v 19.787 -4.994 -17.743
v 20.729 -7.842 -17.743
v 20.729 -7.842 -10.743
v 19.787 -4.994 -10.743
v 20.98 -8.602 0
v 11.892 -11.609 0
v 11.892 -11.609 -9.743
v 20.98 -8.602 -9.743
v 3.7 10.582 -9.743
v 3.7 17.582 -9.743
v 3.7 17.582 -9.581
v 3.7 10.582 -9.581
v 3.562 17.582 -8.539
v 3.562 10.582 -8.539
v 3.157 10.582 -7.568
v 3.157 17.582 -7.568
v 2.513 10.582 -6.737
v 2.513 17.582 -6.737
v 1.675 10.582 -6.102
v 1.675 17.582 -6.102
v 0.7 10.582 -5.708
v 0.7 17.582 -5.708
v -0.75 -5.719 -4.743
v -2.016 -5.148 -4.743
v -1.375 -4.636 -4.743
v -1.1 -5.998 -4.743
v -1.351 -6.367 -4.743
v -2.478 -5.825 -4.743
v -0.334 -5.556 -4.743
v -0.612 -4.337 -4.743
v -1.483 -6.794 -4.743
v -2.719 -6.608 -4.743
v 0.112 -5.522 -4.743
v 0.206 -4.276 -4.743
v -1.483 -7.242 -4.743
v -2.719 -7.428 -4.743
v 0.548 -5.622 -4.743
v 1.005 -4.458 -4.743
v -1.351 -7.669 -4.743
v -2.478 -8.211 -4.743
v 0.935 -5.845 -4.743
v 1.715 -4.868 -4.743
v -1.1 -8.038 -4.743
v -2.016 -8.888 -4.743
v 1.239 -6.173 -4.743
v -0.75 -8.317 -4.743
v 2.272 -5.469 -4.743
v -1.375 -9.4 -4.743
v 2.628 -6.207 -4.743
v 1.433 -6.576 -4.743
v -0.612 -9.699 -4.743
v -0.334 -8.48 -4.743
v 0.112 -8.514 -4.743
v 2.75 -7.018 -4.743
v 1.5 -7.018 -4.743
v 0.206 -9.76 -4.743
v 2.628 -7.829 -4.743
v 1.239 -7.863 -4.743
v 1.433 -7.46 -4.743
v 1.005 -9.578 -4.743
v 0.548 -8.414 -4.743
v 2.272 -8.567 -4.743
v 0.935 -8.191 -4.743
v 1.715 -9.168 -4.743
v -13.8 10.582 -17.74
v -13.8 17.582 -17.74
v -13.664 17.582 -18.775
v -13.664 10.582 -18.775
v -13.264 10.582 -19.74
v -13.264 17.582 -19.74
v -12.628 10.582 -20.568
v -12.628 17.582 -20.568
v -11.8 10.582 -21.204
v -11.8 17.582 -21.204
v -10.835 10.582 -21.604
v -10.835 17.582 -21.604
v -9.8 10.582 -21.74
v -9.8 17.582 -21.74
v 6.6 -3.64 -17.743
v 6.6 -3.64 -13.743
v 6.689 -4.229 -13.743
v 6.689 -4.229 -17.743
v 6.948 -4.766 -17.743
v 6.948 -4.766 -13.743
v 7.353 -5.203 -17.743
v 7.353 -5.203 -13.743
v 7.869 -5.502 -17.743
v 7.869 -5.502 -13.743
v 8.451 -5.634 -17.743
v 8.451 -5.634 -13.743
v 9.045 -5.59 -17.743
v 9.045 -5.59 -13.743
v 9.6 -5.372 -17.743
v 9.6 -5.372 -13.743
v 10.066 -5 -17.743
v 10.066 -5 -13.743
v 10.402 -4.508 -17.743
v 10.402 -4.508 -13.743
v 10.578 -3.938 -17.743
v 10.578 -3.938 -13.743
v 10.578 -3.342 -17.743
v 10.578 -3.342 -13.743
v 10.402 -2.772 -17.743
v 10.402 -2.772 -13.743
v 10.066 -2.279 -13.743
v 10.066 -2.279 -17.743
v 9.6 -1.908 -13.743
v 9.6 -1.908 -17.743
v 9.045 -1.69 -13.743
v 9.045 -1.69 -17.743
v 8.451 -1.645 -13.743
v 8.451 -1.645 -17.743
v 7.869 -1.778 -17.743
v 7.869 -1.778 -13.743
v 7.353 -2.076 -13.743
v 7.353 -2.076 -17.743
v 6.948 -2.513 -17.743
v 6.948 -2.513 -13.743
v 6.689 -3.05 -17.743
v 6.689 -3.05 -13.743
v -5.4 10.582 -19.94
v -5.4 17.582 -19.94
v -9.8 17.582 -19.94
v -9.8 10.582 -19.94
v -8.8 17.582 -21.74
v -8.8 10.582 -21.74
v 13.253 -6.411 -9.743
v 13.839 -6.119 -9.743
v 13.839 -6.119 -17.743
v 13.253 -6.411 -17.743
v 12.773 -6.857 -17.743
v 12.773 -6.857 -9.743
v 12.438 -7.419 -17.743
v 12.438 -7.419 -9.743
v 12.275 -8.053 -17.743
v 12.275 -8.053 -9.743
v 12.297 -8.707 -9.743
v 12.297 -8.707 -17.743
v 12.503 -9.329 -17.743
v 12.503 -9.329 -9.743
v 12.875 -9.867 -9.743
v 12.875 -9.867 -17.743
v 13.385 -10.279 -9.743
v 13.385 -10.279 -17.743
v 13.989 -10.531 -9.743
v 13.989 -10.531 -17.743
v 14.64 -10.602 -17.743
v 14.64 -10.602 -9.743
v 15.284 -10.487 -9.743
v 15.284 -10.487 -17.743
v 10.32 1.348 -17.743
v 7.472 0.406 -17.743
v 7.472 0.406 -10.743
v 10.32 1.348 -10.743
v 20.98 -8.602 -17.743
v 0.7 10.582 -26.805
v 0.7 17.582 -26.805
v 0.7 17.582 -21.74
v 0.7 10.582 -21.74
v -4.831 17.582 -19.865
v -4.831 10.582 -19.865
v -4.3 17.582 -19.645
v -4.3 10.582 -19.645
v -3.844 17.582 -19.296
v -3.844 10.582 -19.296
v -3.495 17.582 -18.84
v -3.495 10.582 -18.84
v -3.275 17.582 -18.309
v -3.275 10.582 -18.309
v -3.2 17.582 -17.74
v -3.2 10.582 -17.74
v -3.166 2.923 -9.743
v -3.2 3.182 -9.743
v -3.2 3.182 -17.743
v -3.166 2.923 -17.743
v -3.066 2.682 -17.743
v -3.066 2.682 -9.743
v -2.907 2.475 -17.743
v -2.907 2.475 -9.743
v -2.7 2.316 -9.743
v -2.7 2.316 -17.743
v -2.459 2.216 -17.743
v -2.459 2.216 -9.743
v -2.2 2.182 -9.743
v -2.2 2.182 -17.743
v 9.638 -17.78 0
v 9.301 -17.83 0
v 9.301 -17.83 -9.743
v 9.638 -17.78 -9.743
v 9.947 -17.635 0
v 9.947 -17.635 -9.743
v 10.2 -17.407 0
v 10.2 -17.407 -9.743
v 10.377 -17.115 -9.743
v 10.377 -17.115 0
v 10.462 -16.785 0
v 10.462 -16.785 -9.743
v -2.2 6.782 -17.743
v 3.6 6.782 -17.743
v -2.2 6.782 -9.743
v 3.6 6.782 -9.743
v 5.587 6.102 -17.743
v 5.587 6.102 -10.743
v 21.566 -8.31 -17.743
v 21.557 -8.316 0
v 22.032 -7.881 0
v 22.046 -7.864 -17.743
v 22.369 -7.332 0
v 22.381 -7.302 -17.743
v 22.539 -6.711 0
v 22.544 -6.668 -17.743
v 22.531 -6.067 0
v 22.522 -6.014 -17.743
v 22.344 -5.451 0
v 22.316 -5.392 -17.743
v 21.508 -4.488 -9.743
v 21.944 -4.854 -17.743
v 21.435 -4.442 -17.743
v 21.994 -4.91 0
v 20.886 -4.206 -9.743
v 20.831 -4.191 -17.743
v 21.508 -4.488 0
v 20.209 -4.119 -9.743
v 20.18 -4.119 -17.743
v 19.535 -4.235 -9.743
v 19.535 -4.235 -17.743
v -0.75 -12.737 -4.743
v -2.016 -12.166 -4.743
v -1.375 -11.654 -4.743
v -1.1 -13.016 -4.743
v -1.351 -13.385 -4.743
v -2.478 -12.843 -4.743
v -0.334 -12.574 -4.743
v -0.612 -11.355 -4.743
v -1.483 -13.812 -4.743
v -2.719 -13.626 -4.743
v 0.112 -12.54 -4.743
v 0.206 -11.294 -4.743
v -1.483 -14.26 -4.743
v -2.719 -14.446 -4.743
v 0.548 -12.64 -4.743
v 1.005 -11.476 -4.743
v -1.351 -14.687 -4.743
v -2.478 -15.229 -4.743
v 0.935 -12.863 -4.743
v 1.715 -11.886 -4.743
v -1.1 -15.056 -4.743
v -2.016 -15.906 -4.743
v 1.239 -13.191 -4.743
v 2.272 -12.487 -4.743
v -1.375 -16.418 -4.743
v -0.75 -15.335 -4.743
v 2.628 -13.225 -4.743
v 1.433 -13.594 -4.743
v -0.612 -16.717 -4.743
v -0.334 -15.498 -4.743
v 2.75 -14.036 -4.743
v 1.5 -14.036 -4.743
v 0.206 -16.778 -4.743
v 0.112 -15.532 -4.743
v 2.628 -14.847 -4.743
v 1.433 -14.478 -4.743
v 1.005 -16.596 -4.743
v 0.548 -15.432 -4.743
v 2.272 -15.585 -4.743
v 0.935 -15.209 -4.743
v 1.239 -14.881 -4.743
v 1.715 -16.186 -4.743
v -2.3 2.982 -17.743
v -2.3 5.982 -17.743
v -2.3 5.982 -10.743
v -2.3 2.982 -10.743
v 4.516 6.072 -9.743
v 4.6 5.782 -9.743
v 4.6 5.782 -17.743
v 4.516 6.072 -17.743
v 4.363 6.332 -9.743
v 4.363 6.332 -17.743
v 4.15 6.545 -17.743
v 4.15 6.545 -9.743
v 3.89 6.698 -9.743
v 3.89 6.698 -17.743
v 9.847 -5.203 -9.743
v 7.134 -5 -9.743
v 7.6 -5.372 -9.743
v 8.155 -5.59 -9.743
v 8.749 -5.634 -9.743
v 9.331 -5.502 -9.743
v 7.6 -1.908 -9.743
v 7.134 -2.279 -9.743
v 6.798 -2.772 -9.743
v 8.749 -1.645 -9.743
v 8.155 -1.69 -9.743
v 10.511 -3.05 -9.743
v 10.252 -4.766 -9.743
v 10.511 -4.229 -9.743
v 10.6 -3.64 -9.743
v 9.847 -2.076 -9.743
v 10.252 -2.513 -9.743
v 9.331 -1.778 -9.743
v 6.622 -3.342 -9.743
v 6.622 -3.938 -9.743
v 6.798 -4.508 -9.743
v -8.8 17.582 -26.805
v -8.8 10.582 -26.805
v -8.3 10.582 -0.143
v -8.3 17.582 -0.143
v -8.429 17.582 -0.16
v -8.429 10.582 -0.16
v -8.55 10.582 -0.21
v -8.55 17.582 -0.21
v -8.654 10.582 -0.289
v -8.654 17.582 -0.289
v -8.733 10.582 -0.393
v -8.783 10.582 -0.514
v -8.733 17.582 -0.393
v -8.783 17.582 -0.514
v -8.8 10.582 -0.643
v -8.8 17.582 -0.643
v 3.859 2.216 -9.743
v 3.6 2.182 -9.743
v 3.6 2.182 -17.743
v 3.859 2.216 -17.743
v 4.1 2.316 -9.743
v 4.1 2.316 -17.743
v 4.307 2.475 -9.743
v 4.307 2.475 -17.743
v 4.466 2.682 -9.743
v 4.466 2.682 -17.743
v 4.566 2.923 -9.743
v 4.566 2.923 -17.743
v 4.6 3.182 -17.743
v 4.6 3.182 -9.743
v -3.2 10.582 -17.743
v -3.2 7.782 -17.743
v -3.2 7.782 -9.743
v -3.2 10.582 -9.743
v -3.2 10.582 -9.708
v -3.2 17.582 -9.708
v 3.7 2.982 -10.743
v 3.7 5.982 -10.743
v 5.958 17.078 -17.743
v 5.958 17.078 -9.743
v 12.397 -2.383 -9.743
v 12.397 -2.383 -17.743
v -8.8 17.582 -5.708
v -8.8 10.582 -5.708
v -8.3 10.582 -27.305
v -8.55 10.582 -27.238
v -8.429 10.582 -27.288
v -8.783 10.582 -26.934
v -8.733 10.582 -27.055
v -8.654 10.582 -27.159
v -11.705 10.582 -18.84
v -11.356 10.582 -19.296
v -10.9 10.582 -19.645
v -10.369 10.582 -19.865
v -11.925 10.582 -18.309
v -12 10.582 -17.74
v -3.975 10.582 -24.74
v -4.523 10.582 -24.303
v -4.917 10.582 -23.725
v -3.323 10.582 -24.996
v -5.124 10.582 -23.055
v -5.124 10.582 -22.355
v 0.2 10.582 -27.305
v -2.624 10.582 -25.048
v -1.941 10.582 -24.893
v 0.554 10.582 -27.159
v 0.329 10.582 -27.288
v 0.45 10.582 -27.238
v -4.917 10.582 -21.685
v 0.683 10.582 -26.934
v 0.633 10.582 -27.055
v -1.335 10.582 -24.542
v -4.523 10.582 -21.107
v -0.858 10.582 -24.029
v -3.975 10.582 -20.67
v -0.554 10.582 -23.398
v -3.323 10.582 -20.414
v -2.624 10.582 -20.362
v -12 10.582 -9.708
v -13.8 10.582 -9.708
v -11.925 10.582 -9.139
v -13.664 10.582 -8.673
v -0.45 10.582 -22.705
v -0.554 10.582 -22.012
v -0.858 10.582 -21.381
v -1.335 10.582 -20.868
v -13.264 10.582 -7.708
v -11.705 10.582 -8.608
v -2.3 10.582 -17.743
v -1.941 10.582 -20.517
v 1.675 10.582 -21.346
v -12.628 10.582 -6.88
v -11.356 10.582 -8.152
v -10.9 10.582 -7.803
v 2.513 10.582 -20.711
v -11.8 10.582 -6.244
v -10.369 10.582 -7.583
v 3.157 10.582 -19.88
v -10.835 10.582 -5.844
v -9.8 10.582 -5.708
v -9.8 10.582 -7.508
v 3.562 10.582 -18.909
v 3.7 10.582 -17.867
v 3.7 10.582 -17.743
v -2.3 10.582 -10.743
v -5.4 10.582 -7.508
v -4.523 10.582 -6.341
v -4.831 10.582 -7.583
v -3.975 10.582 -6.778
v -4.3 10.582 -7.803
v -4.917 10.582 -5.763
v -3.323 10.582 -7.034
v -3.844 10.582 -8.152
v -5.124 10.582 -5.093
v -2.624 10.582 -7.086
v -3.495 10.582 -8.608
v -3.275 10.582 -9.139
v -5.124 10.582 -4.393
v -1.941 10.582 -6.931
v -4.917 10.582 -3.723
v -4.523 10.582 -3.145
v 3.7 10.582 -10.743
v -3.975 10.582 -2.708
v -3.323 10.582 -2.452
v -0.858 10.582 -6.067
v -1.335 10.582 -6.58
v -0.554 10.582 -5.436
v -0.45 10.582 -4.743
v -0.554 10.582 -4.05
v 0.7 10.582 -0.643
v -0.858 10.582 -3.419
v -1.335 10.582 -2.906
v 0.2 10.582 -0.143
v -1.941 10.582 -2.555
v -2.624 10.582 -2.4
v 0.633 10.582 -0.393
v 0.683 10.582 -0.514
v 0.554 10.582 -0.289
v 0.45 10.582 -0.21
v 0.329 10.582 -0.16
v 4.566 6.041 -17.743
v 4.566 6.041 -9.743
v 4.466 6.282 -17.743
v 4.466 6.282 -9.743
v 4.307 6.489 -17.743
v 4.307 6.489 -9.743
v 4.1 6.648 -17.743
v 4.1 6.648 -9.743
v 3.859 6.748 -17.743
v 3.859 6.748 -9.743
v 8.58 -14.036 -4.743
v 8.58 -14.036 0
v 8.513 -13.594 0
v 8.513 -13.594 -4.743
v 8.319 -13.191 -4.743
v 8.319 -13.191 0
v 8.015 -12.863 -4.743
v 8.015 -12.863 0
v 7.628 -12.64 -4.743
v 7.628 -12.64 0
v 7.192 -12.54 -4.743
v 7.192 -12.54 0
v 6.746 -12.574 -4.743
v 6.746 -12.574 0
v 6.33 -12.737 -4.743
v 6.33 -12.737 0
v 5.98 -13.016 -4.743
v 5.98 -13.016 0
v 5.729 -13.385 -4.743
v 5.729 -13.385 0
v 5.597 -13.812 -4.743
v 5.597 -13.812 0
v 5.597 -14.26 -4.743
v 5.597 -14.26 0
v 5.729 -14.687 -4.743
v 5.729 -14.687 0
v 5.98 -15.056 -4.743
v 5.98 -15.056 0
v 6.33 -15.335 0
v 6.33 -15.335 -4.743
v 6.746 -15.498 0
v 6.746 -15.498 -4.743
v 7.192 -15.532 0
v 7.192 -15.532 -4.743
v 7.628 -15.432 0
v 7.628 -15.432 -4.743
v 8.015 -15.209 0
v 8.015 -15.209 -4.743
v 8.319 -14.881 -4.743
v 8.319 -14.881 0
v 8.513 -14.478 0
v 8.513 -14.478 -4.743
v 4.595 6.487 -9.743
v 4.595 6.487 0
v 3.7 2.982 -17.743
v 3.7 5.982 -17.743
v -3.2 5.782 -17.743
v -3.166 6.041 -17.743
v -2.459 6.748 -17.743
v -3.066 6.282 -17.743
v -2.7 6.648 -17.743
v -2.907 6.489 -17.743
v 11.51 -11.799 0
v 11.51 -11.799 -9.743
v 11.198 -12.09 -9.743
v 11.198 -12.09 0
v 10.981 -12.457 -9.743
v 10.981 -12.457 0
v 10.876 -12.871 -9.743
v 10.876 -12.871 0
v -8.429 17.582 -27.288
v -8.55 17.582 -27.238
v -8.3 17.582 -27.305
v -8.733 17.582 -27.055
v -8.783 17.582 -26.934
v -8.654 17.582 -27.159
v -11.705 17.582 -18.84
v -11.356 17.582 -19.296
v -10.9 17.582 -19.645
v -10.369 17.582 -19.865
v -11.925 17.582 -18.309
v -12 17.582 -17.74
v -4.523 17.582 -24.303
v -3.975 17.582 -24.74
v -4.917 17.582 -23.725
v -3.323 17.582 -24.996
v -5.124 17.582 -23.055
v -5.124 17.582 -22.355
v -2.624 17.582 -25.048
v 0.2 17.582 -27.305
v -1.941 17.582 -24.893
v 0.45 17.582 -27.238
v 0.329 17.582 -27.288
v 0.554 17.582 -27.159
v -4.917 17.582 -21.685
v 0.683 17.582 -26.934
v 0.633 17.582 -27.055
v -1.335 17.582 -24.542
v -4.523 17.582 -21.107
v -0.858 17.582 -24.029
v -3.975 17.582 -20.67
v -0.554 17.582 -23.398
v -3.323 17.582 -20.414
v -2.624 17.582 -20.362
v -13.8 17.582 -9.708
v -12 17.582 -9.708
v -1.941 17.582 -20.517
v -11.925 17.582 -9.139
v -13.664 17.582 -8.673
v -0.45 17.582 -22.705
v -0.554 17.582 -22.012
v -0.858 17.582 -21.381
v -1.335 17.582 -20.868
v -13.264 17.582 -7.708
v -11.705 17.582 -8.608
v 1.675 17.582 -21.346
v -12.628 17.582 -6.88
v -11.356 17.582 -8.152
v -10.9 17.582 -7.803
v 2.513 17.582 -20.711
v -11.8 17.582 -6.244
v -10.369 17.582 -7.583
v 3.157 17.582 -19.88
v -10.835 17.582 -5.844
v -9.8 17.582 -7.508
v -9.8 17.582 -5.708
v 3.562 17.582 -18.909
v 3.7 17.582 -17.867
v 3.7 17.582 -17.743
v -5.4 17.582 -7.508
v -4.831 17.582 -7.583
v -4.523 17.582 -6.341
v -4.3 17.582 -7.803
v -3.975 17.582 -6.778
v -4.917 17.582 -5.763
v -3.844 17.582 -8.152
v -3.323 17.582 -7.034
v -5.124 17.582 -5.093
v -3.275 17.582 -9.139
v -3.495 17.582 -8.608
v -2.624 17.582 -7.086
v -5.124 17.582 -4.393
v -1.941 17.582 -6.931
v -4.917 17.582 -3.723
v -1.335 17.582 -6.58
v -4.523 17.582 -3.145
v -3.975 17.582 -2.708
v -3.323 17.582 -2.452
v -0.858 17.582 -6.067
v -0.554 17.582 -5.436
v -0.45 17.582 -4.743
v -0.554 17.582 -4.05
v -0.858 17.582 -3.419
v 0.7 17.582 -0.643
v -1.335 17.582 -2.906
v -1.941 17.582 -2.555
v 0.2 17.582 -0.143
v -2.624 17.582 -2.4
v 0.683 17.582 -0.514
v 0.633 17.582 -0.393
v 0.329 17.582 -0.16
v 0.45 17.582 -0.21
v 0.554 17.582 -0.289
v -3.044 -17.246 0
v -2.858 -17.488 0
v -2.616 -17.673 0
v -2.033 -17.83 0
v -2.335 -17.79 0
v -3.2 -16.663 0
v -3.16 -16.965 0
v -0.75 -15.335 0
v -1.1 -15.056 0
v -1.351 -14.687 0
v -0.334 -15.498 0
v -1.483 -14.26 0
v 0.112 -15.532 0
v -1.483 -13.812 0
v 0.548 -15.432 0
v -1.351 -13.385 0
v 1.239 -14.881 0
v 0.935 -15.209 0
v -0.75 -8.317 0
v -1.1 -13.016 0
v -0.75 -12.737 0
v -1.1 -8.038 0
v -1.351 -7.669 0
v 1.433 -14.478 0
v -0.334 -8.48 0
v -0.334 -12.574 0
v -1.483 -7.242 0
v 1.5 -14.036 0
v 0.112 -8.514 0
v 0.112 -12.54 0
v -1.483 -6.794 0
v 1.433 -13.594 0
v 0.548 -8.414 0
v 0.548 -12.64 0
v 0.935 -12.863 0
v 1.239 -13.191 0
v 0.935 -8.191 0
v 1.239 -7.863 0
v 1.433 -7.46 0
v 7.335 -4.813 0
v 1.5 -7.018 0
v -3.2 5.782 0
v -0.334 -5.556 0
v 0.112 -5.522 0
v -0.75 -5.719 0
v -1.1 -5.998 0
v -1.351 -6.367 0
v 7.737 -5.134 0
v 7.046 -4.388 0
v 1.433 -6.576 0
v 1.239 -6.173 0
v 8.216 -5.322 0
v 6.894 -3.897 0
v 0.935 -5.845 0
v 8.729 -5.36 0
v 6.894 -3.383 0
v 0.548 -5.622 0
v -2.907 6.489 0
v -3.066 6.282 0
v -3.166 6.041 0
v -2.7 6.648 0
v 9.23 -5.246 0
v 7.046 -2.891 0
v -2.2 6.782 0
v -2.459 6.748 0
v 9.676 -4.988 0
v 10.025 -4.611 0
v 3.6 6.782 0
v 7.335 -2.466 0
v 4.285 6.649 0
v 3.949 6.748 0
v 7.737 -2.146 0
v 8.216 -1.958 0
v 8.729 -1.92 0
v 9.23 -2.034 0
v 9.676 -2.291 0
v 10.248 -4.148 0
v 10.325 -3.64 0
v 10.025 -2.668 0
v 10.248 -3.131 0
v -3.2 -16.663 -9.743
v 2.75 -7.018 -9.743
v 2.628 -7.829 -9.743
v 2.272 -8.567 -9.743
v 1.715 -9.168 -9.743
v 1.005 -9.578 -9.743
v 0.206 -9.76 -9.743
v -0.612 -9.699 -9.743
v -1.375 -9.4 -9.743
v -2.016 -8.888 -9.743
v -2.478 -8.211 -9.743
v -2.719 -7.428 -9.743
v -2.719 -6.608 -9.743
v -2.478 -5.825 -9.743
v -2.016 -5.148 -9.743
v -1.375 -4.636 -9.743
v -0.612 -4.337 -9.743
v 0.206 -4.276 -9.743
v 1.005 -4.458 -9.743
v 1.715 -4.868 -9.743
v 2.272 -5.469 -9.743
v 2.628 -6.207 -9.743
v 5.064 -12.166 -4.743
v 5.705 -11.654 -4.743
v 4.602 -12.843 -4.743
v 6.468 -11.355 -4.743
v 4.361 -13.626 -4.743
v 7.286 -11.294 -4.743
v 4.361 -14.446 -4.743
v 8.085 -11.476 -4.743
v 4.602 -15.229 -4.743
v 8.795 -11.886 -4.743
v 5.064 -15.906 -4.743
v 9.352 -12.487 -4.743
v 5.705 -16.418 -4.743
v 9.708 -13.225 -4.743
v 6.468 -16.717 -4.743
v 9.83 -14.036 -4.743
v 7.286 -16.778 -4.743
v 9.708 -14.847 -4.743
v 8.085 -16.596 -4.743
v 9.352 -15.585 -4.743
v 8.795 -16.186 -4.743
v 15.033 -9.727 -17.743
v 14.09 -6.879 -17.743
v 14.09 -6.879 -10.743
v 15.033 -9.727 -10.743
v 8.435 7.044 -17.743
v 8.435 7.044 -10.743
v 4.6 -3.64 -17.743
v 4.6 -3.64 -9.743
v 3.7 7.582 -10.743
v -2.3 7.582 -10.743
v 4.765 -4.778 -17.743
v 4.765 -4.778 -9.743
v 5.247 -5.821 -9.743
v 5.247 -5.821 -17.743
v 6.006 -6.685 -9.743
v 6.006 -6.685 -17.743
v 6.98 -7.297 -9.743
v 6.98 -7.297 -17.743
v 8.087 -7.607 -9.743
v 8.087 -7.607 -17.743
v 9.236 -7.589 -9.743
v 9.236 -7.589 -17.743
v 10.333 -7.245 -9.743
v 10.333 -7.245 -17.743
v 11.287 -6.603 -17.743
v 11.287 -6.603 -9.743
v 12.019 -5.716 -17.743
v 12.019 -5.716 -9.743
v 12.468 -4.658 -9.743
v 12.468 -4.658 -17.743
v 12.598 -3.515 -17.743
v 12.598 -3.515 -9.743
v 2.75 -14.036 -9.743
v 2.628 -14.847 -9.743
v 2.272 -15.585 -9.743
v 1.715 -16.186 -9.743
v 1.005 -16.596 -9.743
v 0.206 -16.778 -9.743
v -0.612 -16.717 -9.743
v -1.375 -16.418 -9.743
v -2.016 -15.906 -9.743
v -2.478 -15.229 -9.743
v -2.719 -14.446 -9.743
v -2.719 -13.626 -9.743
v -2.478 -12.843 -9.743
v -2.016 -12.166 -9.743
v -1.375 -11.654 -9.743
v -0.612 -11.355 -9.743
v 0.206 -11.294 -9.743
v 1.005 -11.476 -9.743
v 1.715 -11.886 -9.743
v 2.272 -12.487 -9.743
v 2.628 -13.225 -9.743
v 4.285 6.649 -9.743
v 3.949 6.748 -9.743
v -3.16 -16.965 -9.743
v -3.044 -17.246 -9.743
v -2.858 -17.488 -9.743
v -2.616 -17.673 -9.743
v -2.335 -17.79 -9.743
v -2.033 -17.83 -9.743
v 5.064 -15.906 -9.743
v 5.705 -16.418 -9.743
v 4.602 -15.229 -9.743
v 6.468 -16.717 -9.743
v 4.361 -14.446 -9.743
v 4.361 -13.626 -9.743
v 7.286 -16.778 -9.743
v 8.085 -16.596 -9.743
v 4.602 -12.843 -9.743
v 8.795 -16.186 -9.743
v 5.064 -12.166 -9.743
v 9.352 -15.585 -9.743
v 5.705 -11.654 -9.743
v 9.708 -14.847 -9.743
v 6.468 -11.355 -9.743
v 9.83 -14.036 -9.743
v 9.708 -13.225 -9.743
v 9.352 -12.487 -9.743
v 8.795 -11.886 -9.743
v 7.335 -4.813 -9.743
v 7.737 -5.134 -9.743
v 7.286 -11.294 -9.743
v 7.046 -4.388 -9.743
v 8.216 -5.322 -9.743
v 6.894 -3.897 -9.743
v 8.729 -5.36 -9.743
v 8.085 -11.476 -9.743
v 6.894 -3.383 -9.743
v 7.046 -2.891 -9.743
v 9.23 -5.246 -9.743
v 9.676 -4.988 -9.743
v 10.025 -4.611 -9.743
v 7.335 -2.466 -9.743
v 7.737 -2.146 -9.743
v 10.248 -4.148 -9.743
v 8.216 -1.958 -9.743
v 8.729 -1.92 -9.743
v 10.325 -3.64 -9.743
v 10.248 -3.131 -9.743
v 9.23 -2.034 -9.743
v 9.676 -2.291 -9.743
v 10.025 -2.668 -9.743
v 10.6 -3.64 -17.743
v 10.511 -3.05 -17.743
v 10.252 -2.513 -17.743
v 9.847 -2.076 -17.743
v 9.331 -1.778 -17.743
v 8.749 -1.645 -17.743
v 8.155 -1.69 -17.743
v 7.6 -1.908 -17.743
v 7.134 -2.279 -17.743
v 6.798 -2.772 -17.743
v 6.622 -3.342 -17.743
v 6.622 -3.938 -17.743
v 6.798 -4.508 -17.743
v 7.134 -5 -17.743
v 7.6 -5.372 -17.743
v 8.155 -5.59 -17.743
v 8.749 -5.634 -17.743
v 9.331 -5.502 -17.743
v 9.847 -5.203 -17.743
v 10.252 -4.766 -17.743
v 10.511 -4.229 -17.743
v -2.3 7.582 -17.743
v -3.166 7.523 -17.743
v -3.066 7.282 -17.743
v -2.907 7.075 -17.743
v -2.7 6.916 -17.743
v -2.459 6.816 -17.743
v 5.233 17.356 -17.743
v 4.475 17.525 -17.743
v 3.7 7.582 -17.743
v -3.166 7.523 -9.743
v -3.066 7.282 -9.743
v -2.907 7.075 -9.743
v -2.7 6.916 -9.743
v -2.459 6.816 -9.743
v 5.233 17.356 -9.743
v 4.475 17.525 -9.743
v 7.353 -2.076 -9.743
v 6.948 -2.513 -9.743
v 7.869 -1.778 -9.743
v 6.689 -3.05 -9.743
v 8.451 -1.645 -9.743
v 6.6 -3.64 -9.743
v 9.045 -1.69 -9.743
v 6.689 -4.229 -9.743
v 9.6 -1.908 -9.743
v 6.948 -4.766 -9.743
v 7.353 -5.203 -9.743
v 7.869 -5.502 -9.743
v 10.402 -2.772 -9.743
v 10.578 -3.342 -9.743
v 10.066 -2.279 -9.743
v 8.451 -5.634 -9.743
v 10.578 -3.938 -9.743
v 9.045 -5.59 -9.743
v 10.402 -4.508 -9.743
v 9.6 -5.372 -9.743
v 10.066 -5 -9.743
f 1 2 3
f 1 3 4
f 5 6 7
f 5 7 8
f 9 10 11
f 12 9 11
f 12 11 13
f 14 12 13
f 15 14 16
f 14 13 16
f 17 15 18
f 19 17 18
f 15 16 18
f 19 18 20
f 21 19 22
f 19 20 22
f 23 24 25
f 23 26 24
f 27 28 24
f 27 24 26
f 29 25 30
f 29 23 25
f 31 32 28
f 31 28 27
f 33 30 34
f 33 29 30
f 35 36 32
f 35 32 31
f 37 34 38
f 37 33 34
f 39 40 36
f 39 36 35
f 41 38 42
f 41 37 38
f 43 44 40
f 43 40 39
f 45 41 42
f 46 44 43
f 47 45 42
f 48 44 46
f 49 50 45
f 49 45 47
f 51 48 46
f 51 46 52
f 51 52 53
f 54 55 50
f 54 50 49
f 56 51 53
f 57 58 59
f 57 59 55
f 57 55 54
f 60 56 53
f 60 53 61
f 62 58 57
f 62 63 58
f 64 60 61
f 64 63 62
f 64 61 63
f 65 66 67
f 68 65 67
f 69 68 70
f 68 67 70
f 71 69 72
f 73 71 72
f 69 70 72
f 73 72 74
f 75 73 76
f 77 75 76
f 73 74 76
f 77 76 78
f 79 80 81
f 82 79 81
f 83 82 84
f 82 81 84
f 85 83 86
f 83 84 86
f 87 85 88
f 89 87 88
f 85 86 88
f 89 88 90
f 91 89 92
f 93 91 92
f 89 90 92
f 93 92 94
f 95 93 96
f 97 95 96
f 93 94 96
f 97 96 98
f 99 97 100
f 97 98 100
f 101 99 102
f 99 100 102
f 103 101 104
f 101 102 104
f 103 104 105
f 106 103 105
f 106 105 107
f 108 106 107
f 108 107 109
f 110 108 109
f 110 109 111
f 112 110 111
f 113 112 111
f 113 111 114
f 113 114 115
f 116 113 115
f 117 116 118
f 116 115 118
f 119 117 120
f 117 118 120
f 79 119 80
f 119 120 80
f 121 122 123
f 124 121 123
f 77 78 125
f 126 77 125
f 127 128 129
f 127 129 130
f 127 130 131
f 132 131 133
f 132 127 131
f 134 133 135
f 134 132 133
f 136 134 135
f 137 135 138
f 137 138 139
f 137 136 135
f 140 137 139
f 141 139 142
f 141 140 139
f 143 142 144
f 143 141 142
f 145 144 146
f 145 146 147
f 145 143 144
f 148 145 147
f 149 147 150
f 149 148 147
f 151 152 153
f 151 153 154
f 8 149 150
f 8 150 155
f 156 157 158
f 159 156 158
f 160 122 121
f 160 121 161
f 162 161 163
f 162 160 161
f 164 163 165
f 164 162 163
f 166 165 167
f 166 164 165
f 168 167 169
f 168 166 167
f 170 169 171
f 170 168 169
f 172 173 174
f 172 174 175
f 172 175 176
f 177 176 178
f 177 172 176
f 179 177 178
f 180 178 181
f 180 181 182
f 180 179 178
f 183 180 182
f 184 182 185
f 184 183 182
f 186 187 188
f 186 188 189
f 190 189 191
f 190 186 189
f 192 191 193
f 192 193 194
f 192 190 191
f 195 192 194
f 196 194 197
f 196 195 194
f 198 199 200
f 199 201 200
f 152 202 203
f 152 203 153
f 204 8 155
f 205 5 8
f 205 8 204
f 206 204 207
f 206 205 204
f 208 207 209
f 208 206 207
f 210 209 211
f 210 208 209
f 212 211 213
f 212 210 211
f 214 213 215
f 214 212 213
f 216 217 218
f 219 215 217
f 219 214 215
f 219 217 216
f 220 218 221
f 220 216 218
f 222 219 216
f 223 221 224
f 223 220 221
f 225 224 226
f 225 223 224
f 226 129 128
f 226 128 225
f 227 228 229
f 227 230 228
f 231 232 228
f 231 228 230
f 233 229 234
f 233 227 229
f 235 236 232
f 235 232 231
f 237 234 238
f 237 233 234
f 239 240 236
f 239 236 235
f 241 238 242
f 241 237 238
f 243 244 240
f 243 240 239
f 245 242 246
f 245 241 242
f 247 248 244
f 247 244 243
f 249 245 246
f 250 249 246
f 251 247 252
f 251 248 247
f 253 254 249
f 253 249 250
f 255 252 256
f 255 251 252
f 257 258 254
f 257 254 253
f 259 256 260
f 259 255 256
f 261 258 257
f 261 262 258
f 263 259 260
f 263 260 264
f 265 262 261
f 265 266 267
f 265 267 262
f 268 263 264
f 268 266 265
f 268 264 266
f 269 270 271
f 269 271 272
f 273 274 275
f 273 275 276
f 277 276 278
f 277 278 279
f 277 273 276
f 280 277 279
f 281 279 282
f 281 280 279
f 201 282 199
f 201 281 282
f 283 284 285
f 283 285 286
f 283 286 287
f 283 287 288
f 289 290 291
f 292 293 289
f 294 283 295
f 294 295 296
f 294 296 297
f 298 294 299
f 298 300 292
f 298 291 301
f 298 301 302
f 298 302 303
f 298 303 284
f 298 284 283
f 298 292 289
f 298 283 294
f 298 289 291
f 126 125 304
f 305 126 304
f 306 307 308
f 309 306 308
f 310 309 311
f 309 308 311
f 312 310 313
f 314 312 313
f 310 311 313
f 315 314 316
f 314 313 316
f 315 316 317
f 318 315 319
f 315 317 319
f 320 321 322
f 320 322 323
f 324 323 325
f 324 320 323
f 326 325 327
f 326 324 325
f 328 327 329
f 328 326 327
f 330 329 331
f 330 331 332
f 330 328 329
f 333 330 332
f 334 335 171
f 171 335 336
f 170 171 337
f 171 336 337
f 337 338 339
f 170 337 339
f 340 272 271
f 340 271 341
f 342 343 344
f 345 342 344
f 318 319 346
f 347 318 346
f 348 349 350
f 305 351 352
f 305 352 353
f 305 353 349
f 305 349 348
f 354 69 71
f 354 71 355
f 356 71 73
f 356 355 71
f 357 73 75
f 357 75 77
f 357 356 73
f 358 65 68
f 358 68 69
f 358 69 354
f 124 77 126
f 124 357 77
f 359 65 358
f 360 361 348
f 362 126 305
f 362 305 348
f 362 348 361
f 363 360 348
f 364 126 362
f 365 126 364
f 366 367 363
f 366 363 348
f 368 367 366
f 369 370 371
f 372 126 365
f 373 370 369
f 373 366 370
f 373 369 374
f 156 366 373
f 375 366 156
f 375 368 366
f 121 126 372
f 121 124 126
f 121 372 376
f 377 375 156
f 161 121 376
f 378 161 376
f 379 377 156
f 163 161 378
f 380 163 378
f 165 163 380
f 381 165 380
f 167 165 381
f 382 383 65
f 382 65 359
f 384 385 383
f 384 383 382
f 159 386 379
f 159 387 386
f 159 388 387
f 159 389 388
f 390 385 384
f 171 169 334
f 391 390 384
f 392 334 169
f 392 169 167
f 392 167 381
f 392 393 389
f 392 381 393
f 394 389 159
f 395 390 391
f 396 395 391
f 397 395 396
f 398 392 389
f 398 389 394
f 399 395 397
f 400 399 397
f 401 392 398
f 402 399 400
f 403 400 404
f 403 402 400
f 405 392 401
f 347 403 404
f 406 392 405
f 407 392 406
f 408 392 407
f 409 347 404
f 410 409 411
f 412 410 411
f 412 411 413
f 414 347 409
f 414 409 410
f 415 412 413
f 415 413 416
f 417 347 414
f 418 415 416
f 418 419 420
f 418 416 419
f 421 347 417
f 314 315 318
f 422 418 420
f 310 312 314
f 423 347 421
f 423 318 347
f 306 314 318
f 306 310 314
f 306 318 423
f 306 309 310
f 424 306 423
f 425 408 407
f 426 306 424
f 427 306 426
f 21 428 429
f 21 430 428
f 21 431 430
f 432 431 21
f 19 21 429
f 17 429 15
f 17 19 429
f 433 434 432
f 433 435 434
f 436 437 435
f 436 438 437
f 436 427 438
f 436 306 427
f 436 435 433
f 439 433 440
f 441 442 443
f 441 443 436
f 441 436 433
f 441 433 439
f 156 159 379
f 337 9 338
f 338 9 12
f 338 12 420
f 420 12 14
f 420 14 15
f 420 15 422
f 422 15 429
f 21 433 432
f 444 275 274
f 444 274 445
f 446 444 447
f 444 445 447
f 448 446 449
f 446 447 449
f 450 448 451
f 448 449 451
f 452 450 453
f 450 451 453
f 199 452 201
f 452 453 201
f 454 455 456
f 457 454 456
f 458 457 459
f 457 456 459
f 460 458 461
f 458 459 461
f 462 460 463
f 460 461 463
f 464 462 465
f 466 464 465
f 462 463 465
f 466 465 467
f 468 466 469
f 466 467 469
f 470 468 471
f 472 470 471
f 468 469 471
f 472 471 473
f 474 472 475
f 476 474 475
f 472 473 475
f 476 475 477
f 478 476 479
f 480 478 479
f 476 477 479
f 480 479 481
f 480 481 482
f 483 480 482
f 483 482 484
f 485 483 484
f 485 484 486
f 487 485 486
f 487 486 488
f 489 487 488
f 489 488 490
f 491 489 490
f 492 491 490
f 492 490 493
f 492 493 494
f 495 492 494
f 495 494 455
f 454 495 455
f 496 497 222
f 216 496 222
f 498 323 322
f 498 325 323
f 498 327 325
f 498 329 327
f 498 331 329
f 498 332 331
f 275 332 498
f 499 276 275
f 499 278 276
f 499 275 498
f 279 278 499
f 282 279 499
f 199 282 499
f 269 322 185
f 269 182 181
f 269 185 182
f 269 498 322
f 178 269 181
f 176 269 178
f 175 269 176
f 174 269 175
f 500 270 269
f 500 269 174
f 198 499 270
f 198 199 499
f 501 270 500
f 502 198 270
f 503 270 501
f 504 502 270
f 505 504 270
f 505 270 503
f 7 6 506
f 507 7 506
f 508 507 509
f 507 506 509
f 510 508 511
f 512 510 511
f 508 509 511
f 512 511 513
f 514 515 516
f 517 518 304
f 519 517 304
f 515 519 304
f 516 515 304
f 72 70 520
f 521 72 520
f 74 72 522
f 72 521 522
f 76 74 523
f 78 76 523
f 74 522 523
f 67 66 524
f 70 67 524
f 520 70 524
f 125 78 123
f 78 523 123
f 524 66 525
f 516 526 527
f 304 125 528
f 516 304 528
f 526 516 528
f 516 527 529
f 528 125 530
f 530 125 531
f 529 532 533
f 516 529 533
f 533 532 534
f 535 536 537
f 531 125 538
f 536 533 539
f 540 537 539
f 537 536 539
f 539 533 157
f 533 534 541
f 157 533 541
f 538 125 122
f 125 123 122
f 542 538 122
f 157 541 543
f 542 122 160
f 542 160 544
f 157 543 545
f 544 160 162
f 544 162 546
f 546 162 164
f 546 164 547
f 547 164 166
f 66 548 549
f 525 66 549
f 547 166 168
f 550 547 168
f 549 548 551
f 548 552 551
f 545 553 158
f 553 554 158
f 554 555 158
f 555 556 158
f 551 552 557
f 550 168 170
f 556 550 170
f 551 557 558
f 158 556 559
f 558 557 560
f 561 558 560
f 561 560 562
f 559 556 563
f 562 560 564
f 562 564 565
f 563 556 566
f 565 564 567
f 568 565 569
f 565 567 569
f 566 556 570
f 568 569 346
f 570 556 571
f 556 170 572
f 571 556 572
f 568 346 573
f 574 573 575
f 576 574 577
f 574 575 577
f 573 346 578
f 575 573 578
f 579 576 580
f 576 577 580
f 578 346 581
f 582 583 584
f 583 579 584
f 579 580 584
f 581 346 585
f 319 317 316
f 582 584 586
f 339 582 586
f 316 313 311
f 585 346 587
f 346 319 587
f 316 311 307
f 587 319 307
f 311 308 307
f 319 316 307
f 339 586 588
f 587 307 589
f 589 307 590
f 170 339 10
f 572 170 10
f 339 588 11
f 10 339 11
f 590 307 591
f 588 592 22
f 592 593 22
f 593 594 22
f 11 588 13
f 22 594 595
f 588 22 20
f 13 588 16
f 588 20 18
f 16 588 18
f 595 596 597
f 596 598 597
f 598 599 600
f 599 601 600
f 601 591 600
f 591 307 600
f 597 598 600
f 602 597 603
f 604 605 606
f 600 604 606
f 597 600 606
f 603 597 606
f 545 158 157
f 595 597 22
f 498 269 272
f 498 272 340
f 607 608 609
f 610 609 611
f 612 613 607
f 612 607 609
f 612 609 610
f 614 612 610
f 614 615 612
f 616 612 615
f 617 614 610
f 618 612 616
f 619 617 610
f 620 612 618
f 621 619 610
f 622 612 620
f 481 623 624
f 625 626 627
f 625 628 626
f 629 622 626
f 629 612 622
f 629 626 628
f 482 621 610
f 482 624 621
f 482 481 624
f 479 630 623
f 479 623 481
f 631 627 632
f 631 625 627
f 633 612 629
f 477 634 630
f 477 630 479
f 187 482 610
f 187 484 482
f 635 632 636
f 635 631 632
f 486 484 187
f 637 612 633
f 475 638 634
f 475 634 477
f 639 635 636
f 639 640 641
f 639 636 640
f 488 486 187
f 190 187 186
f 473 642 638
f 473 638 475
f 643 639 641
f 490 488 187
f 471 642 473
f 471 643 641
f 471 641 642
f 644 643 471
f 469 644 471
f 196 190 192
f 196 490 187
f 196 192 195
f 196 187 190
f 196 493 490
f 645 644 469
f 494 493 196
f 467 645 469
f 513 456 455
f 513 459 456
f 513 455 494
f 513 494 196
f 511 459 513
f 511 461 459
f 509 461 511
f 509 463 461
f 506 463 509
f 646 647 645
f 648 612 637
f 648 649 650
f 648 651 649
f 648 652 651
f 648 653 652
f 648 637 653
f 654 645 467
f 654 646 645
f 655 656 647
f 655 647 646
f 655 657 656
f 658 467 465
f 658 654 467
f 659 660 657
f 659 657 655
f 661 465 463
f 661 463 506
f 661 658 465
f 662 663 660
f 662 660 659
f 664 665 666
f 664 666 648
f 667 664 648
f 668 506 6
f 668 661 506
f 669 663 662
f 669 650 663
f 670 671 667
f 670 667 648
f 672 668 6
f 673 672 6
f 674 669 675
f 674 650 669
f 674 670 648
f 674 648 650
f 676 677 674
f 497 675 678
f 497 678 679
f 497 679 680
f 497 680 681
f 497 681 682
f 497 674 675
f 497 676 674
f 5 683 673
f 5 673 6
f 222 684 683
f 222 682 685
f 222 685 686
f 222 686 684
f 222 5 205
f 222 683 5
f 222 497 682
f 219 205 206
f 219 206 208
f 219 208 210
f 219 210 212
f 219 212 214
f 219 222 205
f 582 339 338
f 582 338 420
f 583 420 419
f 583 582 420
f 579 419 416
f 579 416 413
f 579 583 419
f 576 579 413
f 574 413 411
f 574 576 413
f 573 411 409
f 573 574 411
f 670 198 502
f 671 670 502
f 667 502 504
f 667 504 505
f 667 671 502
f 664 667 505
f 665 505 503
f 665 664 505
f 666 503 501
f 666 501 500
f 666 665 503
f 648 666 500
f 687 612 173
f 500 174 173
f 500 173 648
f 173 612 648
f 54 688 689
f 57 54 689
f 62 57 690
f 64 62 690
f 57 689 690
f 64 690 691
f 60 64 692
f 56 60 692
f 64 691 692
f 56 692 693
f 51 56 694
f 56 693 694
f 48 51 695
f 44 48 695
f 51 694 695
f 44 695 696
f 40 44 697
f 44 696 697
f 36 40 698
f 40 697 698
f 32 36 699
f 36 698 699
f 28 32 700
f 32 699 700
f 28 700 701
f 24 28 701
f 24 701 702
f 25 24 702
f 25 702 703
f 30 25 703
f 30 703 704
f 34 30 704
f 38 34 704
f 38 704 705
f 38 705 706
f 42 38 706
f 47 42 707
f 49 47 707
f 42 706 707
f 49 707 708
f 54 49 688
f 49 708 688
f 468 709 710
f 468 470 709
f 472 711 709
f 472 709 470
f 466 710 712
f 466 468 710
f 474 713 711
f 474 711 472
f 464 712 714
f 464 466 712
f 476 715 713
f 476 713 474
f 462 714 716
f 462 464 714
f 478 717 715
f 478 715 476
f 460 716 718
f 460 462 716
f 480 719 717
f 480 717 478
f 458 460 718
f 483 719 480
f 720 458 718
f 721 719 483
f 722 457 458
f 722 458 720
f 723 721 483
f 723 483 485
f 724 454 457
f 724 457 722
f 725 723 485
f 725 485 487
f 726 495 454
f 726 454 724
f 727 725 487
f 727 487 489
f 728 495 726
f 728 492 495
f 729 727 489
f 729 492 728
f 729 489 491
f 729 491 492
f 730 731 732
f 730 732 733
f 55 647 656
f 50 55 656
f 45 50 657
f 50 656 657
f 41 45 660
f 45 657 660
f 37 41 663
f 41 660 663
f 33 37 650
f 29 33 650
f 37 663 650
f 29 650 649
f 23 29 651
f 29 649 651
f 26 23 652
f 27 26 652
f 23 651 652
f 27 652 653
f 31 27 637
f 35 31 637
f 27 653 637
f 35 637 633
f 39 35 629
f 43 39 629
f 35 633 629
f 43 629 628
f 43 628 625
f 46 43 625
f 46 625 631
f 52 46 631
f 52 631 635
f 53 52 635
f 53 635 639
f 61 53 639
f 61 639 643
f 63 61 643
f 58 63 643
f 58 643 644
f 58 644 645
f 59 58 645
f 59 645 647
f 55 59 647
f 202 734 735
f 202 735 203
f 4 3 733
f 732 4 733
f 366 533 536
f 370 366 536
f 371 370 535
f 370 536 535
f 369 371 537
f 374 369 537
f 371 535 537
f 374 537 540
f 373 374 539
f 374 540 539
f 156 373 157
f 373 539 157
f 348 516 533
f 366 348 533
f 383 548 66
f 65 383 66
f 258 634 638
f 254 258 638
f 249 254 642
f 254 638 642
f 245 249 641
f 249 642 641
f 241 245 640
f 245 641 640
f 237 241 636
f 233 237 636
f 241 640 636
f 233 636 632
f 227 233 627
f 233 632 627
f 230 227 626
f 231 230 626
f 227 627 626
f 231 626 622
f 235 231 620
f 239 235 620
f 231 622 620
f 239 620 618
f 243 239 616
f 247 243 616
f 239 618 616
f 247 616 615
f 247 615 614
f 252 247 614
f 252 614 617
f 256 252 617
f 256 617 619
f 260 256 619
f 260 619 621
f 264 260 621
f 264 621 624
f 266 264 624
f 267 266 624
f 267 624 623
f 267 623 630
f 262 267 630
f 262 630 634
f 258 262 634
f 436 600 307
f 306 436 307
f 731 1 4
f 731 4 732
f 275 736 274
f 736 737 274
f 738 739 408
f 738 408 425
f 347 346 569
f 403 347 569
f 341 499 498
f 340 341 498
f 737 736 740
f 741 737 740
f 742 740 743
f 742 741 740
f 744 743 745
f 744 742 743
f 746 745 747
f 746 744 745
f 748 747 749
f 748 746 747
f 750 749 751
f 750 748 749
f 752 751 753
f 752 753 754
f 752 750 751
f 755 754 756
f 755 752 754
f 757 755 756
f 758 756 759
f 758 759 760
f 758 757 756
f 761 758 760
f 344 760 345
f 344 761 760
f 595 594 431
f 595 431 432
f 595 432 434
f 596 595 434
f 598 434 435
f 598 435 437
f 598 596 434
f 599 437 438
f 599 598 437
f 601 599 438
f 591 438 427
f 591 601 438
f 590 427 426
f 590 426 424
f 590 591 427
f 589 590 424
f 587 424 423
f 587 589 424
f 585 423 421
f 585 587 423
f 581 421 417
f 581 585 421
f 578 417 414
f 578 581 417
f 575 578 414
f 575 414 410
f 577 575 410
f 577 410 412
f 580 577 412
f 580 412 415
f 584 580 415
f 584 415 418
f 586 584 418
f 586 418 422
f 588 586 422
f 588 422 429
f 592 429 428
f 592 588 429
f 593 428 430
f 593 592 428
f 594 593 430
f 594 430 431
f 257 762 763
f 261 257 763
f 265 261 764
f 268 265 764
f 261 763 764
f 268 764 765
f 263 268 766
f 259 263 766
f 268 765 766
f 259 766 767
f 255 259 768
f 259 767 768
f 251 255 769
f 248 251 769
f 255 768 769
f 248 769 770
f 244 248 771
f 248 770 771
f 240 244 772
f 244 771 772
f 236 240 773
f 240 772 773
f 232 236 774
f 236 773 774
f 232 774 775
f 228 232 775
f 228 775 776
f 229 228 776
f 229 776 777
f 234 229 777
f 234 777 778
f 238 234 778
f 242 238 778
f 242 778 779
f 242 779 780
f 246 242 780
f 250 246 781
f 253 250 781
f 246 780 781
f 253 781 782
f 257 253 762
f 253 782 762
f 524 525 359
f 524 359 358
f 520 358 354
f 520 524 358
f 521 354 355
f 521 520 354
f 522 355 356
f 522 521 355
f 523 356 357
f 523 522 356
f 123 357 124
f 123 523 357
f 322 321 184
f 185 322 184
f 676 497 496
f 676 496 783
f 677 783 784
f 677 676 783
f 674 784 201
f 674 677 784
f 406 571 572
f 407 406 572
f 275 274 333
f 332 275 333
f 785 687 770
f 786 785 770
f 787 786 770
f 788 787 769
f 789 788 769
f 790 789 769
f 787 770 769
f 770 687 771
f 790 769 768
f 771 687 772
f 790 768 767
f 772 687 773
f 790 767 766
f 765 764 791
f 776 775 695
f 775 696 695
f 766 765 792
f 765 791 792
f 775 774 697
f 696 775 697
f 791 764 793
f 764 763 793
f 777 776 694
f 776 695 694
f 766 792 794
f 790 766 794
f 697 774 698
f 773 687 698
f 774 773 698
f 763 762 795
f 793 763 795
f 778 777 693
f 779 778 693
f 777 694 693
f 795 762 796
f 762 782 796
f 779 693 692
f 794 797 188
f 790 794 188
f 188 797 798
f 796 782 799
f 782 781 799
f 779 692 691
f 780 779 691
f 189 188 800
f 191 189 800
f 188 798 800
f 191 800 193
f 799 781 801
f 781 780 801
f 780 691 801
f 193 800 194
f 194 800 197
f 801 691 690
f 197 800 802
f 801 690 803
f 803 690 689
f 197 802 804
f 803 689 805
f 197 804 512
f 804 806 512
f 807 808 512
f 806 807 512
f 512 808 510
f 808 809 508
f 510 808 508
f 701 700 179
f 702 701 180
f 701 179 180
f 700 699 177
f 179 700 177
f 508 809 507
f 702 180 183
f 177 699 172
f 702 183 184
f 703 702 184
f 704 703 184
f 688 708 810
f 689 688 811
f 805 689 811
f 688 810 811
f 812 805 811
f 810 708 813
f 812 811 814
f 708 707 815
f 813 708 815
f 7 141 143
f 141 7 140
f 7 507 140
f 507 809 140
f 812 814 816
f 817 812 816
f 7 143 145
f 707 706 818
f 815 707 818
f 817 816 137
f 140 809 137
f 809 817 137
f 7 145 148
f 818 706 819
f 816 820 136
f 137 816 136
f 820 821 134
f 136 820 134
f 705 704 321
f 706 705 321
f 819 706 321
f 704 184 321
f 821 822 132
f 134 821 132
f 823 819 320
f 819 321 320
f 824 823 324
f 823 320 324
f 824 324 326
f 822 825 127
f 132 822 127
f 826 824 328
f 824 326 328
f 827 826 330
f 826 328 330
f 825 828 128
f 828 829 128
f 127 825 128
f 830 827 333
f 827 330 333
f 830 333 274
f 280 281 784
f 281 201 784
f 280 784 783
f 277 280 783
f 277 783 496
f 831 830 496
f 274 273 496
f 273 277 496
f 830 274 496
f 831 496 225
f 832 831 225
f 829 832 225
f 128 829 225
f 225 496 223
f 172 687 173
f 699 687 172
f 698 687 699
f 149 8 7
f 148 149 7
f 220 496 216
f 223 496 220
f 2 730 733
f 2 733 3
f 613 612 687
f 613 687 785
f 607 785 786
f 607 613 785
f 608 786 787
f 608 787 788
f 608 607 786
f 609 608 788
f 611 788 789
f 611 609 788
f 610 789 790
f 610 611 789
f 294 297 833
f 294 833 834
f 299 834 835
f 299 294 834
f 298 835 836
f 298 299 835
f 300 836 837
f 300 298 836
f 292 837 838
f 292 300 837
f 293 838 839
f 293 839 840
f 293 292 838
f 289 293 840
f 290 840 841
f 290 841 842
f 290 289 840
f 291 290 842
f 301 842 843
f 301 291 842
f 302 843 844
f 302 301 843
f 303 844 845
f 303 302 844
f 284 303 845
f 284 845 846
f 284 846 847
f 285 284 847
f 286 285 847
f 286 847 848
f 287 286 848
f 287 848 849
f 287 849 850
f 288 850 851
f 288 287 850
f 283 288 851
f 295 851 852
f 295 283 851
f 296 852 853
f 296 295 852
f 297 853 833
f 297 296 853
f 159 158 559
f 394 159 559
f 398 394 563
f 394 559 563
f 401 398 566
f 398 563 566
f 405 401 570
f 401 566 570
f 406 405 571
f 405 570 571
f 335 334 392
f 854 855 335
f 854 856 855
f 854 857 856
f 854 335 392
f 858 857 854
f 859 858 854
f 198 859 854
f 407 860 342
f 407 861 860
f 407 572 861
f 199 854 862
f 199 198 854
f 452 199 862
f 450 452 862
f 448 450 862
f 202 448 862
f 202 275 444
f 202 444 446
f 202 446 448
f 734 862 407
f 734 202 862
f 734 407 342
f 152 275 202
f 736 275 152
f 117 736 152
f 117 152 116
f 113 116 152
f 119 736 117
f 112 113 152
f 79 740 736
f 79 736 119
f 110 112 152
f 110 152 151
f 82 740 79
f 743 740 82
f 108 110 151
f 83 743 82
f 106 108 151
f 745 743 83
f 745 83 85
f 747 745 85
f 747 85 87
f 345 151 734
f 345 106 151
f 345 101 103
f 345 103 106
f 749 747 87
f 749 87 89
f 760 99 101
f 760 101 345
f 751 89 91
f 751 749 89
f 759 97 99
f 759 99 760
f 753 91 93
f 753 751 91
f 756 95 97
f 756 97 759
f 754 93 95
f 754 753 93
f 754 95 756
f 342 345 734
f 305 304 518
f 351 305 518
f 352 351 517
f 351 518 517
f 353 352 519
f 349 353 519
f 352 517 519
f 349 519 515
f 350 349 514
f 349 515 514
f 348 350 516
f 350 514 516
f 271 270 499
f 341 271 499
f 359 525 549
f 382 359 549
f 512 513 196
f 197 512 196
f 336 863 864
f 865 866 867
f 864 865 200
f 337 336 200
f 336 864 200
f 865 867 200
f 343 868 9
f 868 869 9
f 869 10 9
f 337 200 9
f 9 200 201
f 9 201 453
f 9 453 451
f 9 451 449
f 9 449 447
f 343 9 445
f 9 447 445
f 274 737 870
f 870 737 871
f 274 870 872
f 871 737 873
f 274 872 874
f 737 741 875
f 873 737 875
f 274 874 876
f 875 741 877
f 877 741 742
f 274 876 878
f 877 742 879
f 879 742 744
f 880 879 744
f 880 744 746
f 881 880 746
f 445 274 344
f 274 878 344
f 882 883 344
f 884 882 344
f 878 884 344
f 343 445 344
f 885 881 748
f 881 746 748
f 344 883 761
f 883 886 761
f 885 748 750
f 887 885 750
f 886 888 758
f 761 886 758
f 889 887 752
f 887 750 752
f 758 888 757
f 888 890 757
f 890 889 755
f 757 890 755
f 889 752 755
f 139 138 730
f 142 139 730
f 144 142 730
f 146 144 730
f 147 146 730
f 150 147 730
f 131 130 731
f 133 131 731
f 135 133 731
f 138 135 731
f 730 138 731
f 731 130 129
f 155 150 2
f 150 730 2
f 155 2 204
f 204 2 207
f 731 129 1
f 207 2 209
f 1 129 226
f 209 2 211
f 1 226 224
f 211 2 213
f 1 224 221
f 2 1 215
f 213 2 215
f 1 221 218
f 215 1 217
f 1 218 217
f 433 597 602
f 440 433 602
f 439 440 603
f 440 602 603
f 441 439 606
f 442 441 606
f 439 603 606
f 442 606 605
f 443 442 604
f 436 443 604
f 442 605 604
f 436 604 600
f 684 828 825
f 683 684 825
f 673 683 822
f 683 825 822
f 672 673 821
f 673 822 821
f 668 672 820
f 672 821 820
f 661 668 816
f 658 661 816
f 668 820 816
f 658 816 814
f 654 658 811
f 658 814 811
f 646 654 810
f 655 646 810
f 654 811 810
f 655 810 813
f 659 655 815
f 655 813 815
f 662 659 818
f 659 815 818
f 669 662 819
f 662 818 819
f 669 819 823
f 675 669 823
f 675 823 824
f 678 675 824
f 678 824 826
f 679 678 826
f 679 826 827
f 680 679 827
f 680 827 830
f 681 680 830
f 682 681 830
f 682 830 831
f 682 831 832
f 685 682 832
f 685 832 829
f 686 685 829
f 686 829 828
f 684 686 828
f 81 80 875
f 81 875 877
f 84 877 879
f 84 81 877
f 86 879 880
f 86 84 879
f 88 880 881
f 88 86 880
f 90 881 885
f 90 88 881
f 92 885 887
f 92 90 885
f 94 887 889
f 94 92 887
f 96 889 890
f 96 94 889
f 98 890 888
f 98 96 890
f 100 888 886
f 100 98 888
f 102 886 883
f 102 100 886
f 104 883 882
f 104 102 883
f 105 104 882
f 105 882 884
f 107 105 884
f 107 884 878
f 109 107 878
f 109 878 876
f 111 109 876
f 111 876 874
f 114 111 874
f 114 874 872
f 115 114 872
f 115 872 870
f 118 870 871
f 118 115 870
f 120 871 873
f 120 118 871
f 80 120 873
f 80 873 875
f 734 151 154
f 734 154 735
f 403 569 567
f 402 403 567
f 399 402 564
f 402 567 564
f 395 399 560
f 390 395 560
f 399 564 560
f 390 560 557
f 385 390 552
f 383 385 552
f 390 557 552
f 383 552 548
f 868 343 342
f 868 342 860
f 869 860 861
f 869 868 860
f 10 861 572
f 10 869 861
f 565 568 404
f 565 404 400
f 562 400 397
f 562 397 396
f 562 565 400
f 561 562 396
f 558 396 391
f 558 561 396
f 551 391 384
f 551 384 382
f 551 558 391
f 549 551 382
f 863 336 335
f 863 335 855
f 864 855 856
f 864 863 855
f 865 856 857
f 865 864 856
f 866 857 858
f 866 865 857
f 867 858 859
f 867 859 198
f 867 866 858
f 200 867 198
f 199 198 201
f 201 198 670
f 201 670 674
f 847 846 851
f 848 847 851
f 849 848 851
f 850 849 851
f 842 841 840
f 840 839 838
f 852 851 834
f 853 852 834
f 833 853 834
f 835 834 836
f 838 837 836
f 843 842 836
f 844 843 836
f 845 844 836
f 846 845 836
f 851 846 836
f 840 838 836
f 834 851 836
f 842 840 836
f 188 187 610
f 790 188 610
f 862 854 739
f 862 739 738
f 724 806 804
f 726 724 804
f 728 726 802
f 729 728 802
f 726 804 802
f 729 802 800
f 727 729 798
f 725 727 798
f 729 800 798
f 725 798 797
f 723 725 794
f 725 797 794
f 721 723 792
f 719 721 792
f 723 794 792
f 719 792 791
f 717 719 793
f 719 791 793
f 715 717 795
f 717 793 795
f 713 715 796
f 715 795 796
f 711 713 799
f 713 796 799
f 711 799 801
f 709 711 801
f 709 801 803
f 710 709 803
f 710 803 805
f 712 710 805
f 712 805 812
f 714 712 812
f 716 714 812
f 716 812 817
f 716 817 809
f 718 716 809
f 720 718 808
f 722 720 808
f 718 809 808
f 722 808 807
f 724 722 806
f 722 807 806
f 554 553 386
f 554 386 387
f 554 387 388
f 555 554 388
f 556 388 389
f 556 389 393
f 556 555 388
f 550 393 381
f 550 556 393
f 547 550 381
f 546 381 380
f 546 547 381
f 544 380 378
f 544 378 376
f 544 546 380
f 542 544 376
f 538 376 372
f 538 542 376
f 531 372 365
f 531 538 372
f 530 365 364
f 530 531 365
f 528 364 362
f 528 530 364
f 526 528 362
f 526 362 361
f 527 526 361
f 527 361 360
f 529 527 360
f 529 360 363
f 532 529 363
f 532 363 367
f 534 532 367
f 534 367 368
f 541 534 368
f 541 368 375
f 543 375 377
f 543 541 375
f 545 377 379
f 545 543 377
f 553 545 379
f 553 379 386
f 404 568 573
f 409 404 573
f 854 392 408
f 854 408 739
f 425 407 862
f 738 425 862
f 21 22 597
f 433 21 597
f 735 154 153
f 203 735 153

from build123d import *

# Parameters (mm, degrees)
SKETCH_R          = 2.35
PAD_DEPTH         = 7
SKETCH001_R       = 2
PAD001_DEPTH      = 4
PAD001_DEPTH_BACK = 4
SKETCH013_W       = 6
SKETCH013_H       = 3
POCKET_DEPTH      = 7
PAD003_DEPTH      = 17.743
PAD005_DEPTH      = 9.743
PAD006_DEPTH      = 17.743
SKETCH016_W       = 6
SKETCH016_H       = 3
POCKET001_DEPTH   = 7
SKETCH017_R       = 1.725
POCKET002_DEPTH   = 9.744
SKETCH018_R       = 1.5
POCKET003_DEPTH   = 17.744
SKETCH019_R       = 2.75
POCKET004_DEPTH   = 5
SKETCH006_R       = 2
PAD004_DEPTH      = 8


with BuildPart() as body:
    # Sketch → Pad (new body)
    with BuildSketch(Plane.XZ.offset(-17.582)):
        with BuildLine():
            Line((-13.8, -9.708), (-13.8, -17.74))
            ThreePointArc((-13.8, -17.74), (-12.628427, -20.568427), (-9.8, -21.74))
            Line((-9.8, -21.74), (-8.8, -21.74))
            Line((-8.8, -21.74), (-8.8, -26.805))
            ThreePointArc((-8.8, -26.805), (-8.653553, -27.158553), (-8.3, -27.305))
            Line((-8.3, -27.305), (0.2, -27.305))
            ThreePointArc((0.2, -27.305), (0.553553, -27.158553), (0.7, -26.805))
            Line((0.7, -26.805), (0.7, -21.74))
            ThreePointArc((0.7, -21.74), (2.862278, -20.316506), (3.7, -17.867017))
            Line((3.7, -17.867017), (3.7, -9.580983))
            ThreePointArc((3.7, -9.580983), (2.862278, -7.131494), (0.7, -5.708))
            Line((0.7, -5.708), (0.7, -0.643))
            ThreePointArc((0.7, -0.643), (0.553553, -0.289447), (0.2, -0.143))
            Line((0.2, -0.143), (-8.3, -0.143))
            ThreePointArc((-8.3, -0.143), (-8.653553, -0.289447), (-8.8, -0.643))
            Line((-8.8, -0.643), (-8.8, -5.708))
            Line((-8.8, -5.708), (-9.8, -5.708))
            ThreePointArc((-9.8, -5.708), (-12.628427, -6.879573), (-13.8, -9.708))
        make_face()
        with Locations((-2.8, -4.743)):
            Circle(SKETCH_R, mode=Mode.SUBTRACT)
        with Locations((-2.8, -22.705)):
            Circle(SKETCH_R, mode=Mode.SUBTRACT)
        with BuildLine():
            Line((-9.8, -7.508), (-5.4, -7.508))
            ThreePointArc((-3.2, -9.708), (-3.844365, -8.152365), (-5.4, -7.508))
            Line((-3.2, -9.708), (-3.2, -17.74))
            ThreePointArc((-5.4, -19.94), (-3.844365, -19.295635), (-3.2, -17.74))
            Line((-5.4, -19.94), (-9.8, -19.94))
            ThreePointArc((-12, -17.74), (-11.355635, -19.295635), (-9.8, -19.94))
            Line((-12, -17.74), (-12, -9.708))
            ThreePointArc((-9.8, -7.508), (-11.355635, -8.152365), (-12, -9.708))
        make_face(mode=Mode.SUBTRACT)
    extrude(amount=PAD_DEPTH)

    # Sketch001 (on DatumPlane) → Pad001 (join, two sides)
    with BuildSketch(Plane(origin=(0, -8, -13.743), x_dir=(-1, 0, 0), z_dir=(0, 0, 1))) as pad001_sk:
        with BuildLine():
            Line((-5.957868, -25.077929), (-12.397499, -5.616814))
            ThreePointArc((-4.6, -4.360232), (-9.236397, -0.411182), (-12.397499, -5.616814))
            Line((-4.6, -4.360232), (-4.6, -13.782))
            ThreePointArc((-4.6, -13.782), (-4.307107, -14.489107), (-3.6, -14.782))
            Line((-3.6, -14.782), (2.2, -14.782))
            ThreePointArc((3.2, -15.782), (2.907107, -15.074893), (2.2, -14.782))
            Line((3.2, -15.782), (3.2, -18.582))
            Line((3.2, -18.582), (-3.7, -18.582))
            Line((-3.7, -25.582), (-3.7, -18.582))
            ThreePointArc((-5.957868, -25.077929), (-4.856725, -25.45445), (-3.7, -25.582))
        make_face()
        with Locations((-8.6, -4.360232)):
            Circle(SKETCH001_R, mode=Mode.SUBTRACT)
    extrude(amount=PAD001_DEPTH)
    extrude(pad001_sk.sketch, amount=-PAD001_DEPTH_BACK)

    # Sketch013 (on Face32 of Pad001) → Pocket (cut)
    with BuildSketch(Plane(origin=(0, 0, -17.743), x_dir=(1, 0, 0), z_dir=(0, 0, -1))):
        with Locations((0.7, -9.082)):
            Rectangle(SKETCH013_W, SKETCH013_H)
        Polygon((7.472093, -0.405511), (10.320217, -1.347947), (8.435344, -7.044196), (5.587219, -6.101759), align=None)
    extrude(amount=-POCKET_DEPTH, mode=Mode.SUBTRACT)


with BuildPart() as attachment:
    # Sketch003 → Pad003 (new body)
    with BuildSketch(Plane.XY):
        with BuildLine():
            Line((-2.2, 6.782), (3.6, 6.782))
            ThreePointArc((4.6, 5.782), (4.262963, 6.444963), (3.6, 6.782))
            Line((4.6, 5.782), (4.6, 3.182))
            ThreePointArc((3.6, 2.182), (4.307107, 2.474893), (4.6, 3.182))
            Line((3.6, 2.182), (-2.2, 2.182))
            ThreePointArc((-3.2, 3.182), (-2.907107, 2.474893), (-2.2, 2.182))
            Line((-3.2, 3.182), (-3.2, 5.782))
            ThreePointArc((-2.2, 6.782), (-2.907107, 6.489107), (-3.2, 5.782))
        make_face()
    extrude(amount=-PAD003_DEPTH)

    # Sketch015 → Pad005 (join)
    with BuildSketch(Plane.XY):
        with BuildLine():
            Line((-3.2, 5.782), (-3.2, -16.66267))
            ThreePointArc((-3.2, -16.66267), (-2.858143, -17.487985), (-2.032829, -17.829842))
            Line((9.30108, -17.829842), (-2.032829, -17.829842))
            ThreePointArc((9.30108, -17.829842), (10.081813, -17.530278), (10.461785, -16.785358))
            Line((10.875582, -12.870584), (10.461785, -16.785358))
            ThreePointArc((11.892197, -11.608982), (11.198064, -12.090043), (10.875582, -12.870584))
            Line((11.892197, -11.608982), (20.980351, -8.601736))
            ThreePointArc((20.980351, -8.601736), (22.538991, -6.71184), (21.509828, -4.488805))
            Line((4.595489, 6.487307), (21.509828, -4.488805))
            ThreePointArc((4.595489, 6.487307), (4.119096, 6.70678), (3.6, 6.782))
            Line((-2.2, 6.782), (3.6, 6.782))
            ThreePointArc((-2.2, 6.782), (-2.907107, 6.489107), (-3.2, 5.782))
        make_face()
    extrude(amount=-PAD005_DEPTH)

    # Sketch014 → Pad006 (join)
    with BuildSketch(Plane.XY):
        with BuildLine():
            ThreePointArc((13.839032, -6.119485), (12.378005, -9.025582), (15.284102, -10.486609))
            Line((15.284102, -10.486609), (20.980351, -8.601736))
            ThreePointArc((20.980351, -8.601736), (22.441378, -5.695639), (19.535281, -4.234611))
            Line((13.839032, -6.119485), (19.535281, -4.234611))
        make_face()
    extrude(amount=-PAD006_DEPTH)

    # Sketch016 (on Face13 of Pad006) → Pocket001 (cut)
    with BuildSketch(Plane(origin=(0, 0, -17.743), x_dir=(1, 0, 0), z_dir=(0, 0, -1))):
        with Locations((0.7, -4.482)):
            Rectangle(SKETCH016_W, SKETCH016_H)
        Polygon((15.032785, 9.727109), (20.729034, 7.842236), (19.786597, 4.994111), (14.090348, 6.878985), align=None)
    extrude(amount=-POCKET001_DEPTH, mode=Mode.SUBTRACT)

    # Sketch017 (on Face4 of Pocket001) → Pocket002 (cut, through all)
    with BuildSketch(Plane(origin=(0, 0, -9.743), x_dir=(1, 0, 0), z_dir=(0, 0, -1))):
        with Locations((8.6, 3.639768)):
            Circle(SKETCH017_R)
    extrude(amount=-POCKET002_DEPTH, mode=Mode.SUBTRACT)

    # Sketch018 → Pocket003 (cut, through all)
    with BuildSketch(Plane.XY):
        with Locations((0, -7.018)):
            Circle(SKETCH018_R)
        with Locations((0, -14.036)):
            Circle(SKETCH018_R)
        with Locations((7.08, -14.036)):
            Circle(SKETCH018_R)
    extrude(amount=-POCKET003_DEPTH, mode=Mode.SUBTRACT)

    # Sketch019 (on Face4 of Pocket003) → Pocket004 (cut)
    with BuildSketch(Plane(origin=(0, 0, -9.743), x_dir=(1, 0, 0), z_dir=(0, 0, -1))):
        with Locations((0, 14.036)):
            Circle(SKETCH019_R)
        with Locations((7.08, 14.036)):
            Circle(SKETCH019_R)
        with Locations((0, 7.018)):
            Circle(SKETCH019_R)
    extrude(amount=-POCKET004_DEPTH, mode=Mode.SUBTRACT)


with BuildPart() as rotator:
    # Sketch006 (on DatumPlane) → Pad004 (new body)
    with BuildSketch(Plane.XY.offset(-9.743)):
        with Locations((8.6, -3.639768)):
            Circle(SKETCH006_R)
    extrude(amount=-PAD004_DEPTH)


solid = Compound([body.part, attachment.part, rotator.part])
